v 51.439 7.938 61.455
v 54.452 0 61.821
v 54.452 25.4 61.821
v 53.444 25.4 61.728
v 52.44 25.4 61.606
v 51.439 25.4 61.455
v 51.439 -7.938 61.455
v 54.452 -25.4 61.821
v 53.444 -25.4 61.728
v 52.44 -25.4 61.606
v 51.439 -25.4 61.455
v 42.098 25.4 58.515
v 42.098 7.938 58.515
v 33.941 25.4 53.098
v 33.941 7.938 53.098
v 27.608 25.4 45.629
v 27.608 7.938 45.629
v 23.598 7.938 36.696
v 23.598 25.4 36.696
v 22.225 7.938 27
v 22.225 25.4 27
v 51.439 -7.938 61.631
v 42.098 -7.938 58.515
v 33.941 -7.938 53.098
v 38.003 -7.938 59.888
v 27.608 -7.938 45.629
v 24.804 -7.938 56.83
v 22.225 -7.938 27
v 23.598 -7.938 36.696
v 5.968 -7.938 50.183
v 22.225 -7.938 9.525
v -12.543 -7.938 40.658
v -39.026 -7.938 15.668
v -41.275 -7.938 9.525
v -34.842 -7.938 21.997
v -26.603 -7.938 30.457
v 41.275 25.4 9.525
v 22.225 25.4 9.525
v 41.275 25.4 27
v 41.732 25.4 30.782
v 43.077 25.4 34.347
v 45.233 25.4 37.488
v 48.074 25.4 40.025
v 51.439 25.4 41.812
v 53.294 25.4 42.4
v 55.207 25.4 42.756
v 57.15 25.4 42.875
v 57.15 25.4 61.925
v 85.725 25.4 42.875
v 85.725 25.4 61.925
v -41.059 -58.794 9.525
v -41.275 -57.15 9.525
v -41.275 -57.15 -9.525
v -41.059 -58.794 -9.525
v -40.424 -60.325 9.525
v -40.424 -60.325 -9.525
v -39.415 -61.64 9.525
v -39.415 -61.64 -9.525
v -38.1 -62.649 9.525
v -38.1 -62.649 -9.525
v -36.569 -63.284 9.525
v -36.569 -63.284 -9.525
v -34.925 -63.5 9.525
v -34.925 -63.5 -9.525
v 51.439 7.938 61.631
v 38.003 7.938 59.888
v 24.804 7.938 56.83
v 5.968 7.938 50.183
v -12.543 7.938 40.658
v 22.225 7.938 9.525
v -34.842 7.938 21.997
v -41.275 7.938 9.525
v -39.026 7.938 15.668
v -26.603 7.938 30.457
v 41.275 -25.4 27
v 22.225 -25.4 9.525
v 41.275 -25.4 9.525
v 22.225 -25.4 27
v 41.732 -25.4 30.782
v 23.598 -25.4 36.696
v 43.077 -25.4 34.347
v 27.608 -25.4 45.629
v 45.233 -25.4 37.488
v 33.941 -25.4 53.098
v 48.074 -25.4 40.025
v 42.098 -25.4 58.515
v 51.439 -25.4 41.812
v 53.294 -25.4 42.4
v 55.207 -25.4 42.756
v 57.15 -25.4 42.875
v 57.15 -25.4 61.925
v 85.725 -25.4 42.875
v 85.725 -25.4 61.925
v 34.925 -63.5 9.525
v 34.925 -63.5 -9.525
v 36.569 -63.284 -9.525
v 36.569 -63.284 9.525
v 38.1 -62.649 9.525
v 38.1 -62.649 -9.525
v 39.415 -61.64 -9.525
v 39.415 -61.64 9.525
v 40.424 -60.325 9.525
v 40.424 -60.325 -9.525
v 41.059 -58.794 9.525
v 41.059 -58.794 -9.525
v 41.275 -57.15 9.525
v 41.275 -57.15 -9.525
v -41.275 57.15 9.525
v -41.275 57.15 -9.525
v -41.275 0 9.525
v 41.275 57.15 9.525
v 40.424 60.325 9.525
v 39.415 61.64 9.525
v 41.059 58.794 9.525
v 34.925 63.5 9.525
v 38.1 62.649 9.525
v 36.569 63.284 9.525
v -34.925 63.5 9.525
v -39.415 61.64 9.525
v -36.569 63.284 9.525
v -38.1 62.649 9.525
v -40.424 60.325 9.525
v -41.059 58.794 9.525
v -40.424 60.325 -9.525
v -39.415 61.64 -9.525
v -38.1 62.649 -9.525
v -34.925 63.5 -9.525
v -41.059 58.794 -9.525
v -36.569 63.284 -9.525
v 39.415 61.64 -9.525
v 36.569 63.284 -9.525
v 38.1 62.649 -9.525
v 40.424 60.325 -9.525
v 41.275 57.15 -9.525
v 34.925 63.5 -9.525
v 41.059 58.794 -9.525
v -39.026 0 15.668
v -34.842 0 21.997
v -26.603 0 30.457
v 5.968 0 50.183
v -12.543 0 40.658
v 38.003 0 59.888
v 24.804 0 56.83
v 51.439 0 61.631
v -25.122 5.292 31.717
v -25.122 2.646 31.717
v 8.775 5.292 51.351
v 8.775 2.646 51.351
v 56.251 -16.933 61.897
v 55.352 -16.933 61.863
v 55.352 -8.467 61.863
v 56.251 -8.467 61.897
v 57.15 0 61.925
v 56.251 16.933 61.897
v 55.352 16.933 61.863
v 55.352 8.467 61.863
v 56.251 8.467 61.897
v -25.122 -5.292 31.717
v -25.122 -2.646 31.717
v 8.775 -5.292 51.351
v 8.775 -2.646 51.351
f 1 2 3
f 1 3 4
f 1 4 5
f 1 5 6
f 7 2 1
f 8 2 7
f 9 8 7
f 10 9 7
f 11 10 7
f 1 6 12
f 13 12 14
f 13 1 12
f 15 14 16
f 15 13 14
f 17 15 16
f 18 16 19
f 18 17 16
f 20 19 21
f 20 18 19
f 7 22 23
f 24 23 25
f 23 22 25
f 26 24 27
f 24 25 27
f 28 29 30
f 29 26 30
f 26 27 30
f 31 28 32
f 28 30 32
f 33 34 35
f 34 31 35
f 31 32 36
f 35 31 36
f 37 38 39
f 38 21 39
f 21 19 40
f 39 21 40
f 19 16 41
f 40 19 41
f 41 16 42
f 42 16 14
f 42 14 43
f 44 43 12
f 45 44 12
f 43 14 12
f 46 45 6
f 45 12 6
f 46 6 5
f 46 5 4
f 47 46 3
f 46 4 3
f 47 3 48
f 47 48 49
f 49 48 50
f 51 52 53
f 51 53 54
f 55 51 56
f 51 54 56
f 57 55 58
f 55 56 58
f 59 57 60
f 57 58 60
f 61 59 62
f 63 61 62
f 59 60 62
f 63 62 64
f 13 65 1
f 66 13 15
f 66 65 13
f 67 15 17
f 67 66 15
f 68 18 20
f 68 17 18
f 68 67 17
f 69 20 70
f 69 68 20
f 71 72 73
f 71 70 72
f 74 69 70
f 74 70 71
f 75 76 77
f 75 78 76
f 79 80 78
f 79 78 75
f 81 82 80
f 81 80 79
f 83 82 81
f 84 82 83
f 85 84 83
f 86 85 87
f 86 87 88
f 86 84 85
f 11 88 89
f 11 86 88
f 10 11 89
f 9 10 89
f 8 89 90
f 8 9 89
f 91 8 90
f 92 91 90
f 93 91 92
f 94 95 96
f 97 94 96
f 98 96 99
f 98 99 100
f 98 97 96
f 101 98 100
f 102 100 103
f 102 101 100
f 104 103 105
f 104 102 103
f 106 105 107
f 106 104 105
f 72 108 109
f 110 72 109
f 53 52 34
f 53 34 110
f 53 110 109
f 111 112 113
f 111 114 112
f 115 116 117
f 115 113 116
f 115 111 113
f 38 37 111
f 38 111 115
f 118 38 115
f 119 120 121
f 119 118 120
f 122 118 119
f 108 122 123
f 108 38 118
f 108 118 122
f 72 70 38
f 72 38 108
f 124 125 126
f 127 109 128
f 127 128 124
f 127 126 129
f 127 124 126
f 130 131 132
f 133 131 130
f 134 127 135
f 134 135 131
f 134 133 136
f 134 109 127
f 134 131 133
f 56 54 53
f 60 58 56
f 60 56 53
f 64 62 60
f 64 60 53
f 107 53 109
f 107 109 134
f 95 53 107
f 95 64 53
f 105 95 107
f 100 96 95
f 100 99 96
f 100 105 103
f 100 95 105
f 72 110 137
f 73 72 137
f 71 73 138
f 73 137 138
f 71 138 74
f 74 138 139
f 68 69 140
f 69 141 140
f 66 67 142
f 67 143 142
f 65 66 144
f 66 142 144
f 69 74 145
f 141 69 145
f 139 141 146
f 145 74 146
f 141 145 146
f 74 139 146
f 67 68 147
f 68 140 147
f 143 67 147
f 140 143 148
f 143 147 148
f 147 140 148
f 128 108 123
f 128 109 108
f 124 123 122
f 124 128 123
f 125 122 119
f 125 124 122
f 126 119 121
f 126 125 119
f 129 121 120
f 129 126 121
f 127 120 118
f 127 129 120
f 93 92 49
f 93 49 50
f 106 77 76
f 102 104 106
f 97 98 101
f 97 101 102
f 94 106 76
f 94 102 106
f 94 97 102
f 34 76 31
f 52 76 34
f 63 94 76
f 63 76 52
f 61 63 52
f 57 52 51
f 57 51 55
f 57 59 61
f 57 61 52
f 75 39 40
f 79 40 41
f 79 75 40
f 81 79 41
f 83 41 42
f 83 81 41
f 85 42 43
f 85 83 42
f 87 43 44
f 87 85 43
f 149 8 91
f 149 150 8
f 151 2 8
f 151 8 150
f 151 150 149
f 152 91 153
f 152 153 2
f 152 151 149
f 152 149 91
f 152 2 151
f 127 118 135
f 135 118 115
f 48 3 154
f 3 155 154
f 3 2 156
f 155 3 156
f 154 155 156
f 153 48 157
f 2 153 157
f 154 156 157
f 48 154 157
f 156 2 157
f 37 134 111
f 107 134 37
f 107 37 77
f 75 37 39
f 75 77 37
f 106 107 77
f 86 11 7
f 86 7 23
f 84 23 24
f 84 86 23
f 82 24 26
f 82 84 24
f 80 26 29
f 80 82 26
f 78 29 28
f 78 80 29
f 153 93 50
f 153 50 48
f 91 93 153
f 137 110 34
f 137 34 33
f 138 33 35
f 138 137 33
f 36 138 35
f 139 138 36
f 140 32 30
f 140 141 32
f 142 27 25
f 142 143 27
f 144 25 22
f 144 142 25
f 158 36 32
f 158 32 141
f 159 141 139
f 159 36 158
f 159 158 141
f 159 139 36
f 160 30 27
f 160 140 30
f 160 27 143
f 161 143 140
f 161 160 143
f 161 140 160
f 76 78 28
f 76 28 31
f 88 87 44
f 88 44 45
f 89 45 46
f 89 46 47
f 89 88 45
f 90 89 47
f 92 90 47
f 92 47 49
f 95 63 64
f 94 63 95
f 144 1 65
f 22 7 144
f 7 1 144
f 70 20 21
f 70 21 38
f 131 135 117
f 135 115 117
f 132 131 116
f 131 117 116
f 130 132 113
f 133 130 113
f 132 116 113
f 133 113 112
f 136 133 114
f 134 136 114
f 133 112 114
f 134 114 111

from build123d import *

# Parameters (mm, degrees)
F1_DEPTH = 63.5
F2_DEPTH = 25.4
F3_DEPTH = 7.9375
F4_R     = 6.35


with BuildPart() as f1:
    # F0 (on Front) → F1 (new body, symmetric)
    with BuildSketch(Plane.XZ):
        Polygon((-41.275, 9.525), (-41.275, -9.525), (41.275, -9.525), (41.275, 9.525), (22.225, 9.525), align=None)
    extrude(amount=F1_DEPTH, both=True)

    # F0 (on Front) → F2 (join, symmetric)
    with BuildSketch(Plane.XZ):
        with BuildLine():
            Line((22.225, 9.525), (41.275, 9.525))
            Line((41.275, 9.525), (41.275, 27.0002))
            ThreePointArc((41.275, 27.0002), (44.060295, 35.982141), (51.438812, 41.812288))
            Line((51.438812, 41.812288), (51.438812, 61.455068))
            ThreePointArc((51.438812, 61.455068), (30.511505, 49.586616), (22.225, 27.0002))
            Line((22.225, 27.0002), (22.225, 9.525))
        make_face()
        with BuildLine():
            ThreePointArc((54.452364, 61.82086), (52.941612, 61.670722), (51.438812, 61.455068))
            Line((51.438812, 61.455068), (51.438812, 41.812288))
            ThreePointArc((51.438812, 41.812288), (54.245372, 42.60721), (57.15, 42.8752))
            Line((57.15, 42.8752), (85.725, 42.8752))
            Line((85.725, 42.8752), (85.725, 61.9252))
            Line((85.725, 61.9252), (57.15, 61.9252))
            add(Edge.make_bspline(
                [(54.452364, 61.82086), (55.352208, 61.866143), (56.251535, 61.90101), (57.15, 61.9252)],
                knots=[109.319651, 109.319651, 109.319651, 109.319651, 111.504536, 111.504536, 111.504536, 111.504536], degree=3))
        make_face()
    extrude(amount=F2_DEPTH, both=True)

    # F0 (on Front) → F3 (join, symmetric)
    with BuildSketch(Plane.XZ):
        with BuildLine():
            add(Edge.make_bspline(
                [(-41.275, 9.525), (-36.986678, 30.729489), (7.384144, 58.294379), (51.438812, 61.630741)],
                knots=[0, 0, 0, 0, 106.881788, 106.881788, 106.881788, 106.881788], degree=3))
            Line((-41.275, 9.525), (22.225, 9.525))
            Line((22.225, 9.525), (22.225, 27.0002))
            ThreePointArc((22.225, 27.0002), (30.511505, 49.586616), (51.438812, 61.455068))
            Line((51.438812, 61.455068), (51.438812, 61.630741))
        make_face()
    extrude(amount=F3_DEPTH, both=True)

    # F4
    f4_edges = [f1.edges().sort_by_distance(p)[0] for p in [
        (-41.275, -63.5, 0),
        (41.275, -63.5, 0),
        (41.275, 63.5, 0),
        (-41.275, 63.5, 0),
    ]]
    fillet(f4_edges, radius=F4_R)


solid = f1.part
